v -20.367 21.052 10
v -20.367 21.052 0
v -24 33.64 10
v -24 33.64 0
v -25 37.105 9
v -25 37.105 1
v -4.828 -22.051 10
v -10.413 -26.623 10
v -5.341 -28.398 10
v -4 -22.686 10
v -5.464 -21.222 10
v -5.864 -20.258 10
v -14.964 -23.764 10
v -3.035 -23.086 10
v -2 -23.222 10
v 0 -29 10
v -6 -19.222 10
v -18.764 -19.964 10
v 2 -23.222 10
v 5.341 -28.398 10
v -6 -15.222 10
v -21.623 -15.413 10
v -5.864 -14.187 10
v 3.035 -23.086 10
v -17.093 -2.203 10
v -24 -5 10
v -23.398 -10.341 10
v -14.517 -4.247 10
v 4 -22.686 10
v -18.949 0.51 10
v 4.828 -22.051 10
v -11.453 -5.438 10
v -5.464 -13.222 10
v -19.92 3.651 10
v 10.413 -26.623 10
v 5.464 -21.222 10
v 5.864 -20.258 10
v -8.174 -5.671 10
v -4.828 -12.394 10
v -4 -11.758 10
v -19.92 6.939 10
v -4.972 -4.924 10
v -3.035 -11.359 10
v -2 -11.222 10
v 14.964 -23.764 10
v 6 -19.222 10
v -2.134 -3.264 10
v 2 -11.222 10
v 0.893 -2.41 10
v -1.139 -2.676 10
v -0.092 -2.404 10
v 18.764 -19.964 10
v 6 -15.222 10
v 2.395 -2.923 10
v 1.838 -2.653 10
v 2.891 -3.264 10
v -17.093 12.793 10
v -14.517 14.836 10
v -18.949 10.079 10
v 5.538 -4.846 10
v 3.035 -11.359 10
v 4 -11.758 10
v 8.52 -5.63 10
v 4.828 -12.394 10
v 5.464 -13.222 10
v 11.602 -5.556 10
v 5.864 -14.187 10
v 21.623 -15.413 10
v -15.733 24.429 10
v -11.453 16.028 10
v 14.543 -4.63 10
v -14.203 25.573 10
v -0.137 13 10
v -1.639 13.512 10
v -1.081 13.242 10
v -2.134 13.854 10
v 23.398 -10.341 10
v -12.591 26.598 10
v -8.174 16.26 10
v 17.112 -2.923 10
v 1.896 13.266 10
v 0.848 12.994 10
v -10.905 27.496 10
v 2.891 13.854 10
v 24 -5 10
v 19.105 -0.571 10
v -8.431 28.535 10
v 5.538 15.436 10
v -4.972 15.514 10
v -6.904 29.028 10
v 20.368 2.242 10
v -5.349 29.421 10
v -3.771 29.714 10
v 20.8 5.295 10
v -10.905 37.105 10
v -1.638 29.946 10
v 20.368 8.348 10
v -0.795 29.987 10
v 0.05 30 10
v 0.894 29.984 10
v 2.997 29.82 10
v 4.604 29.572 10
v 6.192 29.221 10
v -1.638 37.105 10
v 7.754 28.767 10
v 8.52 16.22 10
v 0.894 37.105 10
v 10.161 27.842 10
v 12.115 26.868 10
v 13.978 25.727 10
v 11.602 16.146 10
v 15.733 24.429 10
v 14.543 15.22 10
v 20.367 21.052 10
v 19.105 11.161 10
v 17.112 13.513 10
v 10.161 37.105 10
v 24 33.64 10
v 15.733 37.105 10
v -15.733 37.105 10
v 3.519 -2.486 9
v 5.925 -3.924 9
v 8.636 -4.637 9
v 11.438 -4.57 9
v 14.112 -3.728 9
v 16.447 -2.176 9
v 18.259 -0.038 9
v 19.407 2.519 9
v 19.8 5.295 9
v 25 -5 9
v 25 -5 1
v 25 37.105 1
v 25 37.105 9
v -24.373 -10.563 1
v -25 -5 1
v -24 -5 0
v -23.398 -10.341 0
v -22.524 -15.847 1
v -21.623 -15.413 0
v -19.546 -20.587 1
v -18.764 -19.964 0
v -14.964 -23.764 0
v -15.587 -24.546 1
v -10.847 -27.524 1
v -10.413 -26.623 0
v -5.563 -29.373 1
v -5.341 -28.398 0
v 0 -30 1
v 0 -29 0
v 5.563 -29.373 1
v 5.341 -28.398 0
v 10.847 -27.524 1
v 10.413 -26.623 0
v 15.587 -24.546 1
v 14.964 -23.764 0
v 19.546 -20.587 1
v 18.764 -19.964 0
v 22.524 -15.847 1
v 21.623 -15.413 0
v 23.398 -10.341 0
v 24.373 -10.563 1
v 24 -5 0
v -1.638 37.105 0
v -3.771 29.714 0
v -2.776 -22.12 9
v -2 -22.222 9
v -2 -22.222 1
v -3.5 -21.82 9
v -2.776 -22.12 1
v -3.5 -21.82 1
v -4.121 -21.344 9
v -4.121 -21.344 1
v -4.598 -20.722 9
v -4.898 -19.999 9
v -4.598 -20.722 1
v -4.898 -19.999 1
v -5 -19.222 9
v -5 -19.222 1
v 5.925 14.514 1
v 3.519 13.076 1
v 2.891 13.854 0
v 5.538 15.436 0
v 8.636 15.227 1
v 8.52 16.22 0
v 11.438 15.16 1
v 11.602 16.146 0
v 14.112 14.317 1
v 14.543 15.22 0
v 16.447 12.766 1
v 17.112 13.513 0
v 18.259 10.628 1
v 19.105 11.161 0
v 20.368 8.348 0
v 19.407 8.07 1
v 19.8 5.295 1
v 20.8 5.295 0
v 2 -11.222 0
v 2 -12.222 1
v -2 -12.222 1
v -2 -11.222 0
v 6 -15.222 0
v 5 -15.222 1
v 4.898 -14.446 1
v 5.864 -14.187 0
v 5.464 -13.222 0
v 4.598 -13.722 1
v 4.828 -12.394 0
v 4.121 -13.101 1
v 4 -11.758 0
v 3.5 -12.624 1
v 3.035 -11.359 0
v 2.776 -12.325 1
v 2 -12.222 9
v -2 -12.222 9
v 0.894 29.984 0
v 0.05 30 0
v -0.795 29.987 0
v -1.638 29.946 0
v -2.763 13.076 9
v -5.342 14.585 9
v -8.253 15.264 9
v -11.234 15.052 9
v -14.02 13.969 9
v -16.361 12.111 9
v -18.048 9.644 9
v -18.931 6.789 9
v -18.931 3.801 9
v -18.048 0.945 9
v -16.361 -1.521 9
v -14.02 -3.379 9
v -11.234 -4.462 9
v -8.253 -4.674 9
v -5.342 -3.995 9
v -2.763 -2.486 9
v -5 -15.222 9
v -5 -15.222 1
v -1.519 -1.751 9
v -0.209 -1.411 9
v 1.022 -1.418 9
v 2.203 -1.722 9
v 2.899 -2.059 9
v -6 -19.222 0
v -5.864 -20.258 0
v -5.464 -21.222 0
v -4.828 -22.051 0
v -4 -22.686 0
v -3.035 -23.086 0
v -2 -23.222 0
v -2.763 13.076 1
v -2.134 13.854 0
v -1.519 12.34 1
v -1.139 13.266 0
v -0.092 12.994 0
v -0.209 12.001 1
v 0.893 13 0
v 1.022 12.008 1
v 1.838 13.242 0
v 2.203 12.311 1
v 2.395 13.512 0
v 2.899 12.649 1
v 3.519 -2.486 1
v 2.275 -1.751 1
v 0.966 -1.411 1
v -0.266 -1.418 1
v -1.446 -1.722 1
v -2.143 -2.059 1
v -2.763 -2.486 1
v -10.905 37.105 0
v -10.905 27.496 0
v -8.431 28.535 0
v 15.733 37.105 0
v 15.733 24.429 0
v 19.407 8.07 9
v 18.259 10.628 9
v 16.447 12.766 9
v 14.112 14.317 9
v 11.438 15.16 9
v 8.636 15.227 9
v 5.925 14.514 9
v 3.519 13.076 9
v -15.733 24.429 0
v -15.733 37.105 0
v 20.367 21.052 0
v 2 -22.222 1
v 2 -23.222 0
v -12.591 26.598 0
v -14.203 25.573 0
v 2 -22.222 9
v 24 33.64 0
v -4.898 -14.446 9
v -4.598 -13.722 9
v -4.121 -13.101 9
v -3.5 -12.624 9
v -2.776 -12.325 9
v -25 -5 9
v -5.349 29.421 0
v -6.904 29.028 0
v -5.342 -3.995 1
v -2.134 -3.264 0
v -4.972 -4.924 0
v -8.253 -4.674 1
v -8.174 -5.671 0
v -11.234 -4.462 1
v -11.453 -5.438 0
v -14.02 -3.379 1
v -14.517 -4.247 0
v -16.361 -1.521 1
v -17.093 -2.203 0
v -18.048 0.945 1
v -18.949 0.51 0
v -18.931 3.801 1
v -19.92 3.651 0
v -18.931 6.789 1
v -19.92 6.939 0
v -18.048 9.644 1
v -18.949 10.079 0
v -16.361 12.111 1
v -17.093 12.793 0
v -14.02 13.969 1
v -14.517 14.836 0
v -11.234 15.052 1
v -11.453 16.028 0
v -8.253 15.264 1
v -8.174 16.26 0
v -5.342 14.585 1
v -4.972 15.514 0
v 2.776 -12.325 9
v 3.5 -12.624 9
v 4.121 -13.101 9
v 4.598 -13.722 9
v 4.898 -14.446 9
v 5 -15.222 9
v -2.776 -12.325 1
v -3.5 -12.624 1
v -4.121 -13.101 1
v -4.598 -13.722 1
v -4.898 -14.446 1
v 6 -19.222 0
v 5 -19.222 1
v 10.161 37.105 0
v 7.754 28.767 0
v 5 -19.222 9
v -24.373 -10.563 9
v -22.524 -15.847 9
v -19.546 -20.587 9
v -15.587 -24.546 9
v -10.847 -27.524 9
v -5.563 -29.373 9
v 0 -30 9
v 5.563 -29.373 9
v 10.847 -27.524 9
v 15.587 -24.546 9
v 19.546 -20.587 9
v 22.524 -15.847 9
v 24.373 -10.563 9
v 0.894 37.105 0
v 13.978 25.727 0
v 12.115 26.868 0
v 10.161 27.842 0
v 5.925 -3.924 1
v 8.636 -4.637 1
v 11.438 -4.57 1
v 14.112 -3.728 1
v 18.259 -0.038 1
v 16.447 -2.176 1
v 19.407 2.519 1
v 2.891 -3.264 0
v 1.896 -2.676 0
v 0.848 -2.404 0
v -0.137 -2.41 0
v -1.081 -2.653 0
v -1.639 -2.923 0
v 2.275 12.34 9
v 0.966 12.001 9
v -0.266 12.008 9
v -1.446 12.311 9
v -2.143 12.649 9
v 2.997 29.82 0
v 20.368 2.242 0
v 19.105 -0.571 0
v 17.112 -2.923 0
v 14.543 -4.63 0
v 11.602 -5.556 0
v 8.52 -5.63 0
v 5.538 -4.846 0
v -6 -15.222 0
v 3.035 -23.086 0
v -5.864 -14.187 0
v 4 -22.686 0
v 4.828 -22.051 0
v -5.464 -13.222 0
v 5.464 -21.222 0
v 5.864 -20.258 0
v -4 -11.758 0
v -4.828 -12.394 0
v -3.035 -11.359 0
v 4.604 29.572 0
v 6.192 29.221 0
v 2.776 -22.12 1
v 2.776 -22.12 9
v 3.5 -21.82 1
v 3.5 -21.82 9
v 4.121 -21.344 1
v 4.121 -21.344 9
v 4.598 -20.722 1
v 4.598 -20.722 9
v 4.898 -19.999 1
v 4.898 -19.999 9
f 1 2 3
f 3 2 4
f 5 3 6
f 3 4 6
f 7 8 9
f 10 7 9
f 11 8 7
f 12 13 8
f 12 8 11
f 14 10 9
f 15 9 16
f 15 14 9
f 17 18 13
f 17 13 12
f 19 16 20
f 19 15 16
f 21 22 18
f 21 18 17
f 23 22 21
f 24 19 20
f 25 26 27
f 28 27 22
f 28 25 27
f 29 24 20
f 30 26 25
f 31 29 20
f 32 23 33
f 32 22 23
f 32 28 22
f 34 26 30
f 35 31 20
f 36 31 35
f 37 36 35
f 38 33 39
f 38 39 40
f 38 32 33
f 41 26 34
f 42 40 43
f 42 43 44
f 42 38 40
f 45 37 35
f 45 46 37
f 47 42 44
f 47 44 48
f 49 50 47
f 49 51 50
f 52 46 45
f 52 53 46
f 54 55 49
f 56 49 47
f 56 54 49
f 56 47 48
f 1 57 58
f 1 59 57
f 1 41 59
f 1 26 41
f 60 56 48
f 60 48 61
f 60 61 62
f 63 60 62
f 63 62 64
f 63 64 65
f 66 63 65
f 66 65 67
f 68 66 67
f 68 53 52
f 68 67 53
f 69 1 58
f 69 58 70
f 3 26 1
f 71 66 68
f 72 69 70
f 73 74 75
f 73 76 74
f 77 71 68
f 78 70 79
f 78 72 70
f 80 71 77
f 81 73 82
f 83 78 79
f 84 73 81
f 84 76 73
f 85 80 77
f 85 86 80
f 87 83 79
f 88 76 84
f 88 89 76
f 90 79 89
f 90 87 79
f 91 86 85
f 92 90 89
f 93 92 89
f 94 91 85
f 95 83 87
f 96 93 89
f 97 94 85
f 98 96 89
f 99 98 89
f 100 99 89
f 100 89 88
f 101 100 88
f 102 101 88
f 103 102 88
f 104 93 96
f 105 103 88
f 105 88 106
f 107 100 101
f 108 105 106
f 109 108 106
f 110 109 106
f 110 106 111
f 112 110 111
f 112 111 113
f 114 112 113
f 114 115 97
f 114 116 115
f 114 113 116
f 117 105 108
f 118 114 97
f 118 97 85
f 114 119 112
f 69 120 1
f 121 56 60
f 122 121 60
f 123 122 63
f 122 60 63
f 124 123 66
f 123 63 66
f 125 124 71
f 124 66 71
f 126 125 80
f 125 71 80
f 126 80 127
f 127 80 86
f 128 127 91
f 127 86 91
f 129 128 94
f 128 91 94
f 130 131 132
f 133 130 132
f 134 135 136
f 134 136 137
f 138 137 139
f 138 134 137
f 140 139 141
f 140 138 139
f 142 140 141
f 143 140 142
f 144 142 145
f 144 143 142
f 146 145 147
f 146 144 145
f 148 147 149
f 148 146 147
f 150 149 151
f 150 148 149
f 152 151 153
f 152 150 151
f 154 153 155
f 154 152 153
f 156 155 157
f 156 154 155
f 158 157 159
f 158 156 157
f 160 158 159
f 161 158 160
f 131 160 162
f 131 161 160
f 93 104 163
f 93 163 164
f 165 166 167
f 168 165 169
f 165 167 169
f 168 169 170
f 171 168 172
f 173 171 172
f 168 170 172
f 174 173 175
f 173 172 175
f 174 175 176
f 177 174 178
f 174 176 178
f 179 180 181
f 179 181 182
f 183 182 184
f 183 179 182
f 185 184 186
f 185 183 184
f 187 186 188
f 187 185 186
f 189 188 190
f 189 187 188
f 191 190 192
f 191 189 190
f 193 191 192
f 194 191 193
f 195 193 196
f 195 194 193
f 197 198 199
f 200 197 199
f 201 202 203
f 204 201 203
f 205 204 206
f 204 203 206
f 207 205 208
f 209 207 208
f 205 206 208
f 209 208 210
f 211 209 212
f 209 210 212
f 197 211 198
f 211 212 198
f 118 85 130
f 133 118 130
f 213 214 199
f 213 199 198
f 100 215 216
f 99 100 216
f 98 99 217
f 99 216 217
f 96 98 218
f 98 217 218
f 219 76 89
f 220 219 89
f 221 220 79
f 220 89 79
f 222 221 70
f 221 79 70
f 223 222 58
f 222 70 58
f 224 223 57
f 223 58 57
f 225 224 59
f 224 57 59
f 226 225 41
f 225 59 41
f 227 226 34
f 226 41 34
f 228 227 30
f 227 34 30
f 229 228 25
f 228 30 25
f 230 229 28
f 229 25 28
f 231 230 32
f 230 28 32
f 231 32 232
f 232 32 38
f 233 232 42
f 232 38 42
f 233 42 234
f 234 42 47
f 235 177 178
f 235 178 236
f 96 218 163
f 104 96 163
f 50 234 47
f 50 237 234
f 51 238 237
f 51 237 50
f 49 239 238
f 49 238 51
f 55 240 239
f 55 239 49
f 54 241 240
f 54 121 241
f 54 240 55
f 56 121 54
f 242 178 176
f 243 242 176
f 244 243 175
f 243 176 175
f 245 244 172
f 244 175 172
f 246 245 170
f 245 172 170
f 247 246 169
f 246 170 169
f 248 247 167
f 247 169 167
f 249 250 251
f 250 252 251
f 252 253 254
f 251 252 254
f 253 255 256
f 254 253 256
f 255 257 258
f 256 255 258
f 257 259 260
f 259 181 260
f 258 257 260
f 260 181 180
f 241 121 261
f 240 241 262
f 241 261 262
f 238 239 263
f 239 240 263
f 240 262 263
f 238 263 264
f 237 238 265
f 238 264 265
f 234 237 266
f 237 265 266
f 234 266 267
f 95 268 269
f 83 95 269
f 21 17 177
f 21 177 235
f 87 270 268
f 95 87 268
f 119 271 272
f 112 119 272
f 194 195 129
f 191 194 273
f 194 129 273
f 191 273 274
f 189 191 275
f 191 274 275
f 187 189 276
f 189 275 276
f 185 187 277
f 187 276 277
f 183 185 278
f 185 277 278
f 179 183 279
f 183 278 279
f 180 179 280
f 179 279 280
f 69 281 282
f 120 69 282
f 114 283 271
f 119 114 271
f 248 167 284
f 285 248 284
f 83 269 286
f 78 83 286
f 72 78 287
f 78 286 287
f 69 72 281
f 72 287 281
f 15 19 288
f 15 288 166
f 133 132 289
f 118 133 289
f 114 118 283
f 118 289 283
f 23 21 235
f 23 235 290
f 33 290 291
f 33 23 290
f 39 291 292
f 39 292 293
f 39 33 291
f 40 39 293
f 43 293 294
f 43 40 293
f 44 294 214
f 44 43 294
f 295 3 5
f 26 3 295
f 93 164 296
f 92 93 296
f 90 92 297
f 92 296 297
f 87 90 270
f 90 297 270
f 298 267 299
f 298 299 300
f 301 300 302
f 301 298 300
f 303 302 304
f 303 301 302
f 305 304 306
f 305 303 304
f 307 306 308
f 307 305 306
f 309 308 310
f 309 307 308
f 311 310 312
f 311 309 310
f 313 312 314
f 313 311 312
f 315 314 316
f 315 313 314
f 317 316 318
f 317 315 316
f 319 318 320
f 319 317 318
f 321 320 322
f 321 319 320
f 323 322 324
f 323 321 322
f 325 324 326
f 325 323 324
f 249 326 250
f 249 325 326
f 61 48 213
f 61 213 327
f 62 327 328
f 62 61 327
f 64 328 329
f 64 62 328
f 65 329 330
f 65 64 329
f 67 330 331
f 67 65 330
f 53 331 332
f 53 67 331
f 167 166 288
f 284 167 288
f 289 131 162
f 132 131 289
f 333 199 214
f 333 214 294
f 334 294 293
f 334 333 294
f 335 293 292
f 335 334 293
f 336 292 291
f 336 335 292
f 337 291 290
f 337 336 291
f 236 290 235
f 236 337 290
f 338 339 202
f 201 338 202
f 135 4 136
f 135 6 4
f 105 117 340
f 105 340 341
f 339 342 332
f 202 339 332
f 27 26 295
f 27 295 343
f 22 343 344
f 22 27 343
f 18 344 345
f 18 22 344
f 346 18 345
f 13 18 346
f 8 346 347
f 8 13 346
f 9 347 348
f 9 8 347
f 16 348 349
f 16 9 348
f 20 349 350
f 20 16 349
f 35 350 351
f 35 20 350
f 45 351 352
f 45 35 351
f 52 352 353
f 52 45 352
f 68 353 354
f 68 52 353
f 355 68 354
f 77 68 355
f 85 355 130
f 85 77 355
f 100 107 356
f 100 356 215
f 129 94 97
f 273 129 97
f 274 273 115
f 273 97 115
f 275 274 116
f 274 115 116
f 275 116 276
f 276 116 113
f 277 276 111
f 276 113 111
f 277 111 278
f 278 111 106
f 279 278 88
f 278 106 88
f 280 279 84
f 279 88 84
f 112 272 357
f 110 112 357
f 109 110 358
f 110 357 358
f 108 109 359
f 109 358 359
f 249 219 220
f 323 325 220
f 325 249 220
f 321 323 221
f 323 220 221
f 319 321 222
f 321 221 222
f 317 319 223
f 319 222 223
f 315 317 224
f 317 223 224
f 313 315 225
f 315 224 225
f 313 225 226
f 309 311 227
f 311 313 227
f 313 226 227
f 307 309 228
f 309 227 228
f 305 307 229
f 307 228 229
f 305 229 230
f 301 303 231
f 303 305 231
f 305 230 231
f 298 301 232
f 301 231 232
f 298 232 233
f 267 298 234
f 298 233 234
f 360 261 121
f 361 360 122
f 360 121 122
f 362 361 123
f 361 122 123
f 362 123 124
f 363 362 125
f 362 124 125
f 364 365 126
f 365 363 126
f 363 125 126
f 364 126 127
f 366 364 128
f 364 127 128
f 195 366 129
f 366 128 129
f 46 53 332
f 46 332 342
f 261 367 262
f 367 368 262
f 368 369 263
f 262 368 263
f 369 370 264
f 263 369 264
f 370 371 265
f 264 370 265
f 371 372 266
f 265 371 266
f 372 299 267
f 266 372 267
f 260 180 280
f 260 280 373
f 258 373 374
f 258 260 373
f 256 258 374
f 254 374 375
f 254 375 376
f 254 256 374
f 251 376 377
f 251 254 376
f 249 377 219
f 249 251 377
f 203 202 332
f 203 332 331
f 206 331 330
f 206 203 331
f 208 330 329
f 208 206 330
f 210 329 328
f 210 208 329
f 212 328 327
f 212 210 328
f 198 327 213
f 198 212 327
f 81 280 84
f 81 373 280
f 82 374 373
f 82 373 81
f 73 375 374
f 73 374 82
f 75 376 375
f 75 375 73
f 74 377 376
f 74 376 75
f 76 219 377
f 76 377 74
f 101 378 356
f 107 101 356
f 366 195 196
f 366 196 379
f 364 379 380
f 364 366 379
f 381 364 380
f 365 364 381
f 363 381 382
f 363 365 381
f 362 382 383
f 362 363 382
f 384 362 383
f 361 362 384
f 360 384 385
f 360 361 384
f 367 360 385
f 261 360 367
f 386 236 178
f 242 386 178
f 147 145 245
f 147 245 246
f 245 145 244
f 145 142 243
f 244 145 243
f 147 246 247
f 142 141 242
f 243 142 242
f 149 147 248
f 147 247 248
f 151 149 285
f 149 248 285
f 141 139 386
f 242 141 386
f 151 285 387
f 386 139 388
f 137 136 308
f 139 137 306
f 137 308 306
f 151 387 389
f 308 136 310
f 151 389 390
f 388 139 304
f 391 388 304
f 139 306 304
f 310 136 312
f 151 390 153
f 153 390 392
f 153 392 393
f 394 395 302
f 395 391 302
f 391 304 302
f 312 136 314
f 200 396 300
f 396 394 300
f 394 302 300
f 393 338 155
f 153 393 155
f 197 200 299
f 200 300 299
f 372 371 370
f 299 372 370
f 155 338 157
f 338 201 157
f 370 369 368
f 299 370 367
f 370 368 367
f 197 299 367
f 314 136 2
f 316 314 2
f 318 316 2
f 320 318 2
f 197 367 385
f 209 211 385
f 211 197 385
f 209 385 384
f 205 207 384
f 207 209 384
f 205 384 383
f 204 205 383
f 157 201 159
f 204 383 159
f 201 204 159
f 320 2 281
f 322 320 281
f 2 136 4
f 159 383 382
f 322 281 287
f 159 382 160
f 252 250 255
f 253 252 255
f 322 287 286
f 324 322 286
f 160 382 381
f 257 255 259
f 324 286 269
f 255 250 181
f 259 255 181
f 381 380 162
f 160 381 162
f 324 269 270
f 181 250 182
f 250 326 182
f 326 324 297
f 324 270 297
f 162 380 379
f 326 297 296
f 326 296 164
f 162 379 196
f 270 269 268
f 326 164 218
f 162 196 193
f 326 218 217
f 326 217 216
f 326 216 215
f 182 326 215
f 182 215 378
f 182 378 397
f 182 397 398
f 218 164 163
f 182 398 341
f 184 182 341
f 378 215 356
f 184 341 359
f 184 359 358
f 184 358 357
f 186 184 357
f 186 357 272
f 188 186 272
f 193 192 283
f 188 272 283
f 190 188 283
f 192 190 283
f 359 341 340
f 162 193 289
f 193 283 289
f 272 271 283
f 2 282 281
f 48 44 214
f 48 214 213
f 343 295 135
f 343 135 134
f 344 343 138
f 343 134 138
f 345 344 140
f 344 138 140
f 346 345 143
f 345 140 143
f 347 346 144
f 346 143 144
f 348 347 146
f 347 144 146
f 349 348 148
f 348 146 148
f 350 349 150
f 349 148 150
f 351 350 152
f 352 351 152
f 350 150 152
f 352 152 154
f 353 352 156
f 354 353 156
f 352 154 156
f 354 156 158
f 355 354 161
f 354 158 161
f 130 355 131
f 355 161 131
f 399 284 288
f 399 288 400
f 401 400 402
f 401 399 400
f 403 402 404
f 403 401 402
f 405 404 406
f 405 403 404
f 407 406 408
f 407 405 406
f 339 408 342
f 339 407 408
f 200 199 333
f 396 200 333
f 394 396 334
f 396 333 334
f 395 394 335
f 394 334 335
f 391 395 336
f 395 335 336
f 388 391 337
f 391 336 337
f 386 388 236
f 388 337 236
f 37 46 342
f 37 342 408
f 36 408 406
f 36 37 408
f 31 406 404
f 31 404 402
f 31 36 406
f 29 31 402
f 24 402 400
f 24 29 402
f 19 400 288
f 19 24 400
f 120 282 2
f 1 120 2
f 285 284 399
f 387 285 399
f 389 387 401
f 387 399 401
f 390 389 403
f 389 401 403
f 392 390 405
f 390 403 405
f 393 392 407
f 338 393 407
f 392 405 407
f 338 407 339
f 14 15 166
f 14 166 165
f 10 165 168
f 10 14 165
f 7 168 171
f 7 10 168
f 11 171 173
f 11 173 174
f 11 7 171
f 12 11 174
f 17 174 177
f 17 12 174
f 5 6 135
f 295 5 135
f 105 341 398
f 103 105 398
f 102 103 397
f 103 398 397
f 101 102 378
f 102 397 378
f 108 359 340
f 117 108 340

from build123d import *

# Parameters (mm, degrees)
F1_DEPTH = 10
F3_DEPTH = 25
F4_R     = 5
F5_W     = 10
F5_H     = 10
F6_DEPTH = 25
F7_R     = 3
F8_SIZE  = 1


with BuildPart() as f1:
    # F0 (on Top) → F1 (new body)
    with BuildSketch(Plane.XY):
        Polygon((-10.9047358856, 5), (-1.6377953812, 5), (-6.2712656334, 21.0524187982), align=None)
        Polygon((0.893718563, 5), (10.1606590673, 5), (5.5271888152, 21.0524187982), align=None)
        with BuildLine():
            ThreePointArc((-25, -5), (0, -30), (25, -5))
            Line((25, -5), (-25, -5))
        make_face()
        with BuildLine():
            ThreePointArc((7.7540047355, 28.767107745), (8.969264738, 28.3356441964), (10.1606590673, 27.842088506))
            Line((10.1606590673, 27.842088506), (10.1606590673, 37.1048375964))
            Line((10.1606590673, 37.1048375964), (7.7540047355, 28.767107745))
        make_face()
        with BuildLine():
            Line((0.893718563, 37.1048375964), (0.893718563, 29.9840202355))
            ThreePointArc((0.893718563, 29.9840202355), (1.9468556818, 29.9240797815), (2.9965268036, 29.8197668626))
            Line((2.9965268036, 29.8197668626), (0.893718563, 37.1048375964))
        make_face()
        with BuildLine():
            ThreePointArc((-3.7711526138, 29.713931455), (-2.7069683761, 29.8530143486), (-1.6377953812, 29.9462948409))
            Line((-1.6377953812, 29.9462948409), (-1.6377953812, 37.1048375964))
            Line((-1.6377953812, 37.1048375964), (-3.7711526138, 29.713931455))
        make_face()
        with BuildLine():
            Line((-10.9047358856, 37.1048375964), (-10.9047358856, 27.4963716022))
            ThreePointArc((-10.9047358856, 27.4963716022), (-9.6819154679, 28.0490891983), (-8.4311989498, 28.535396412))
            Line((-8.4311989498, 28.535396412), (-10.9047358856, 37.1048375964))
        make_face()
        with BuildLine():
            ThreePointArc((21.1545569723, 18.3223391079), (24.0194080309, 11.9331117001), (25, 5))
            Line((25, 5), (25, 37.1048375964))
            Line((25, 37.1048375964), (20.3665297478, 21.0524187982))
            Line((20.3665297478, 21.0524187982), (21.1545569723, 18.3223391079))
        make_face()
        with BuildLine():
            Line((21.1545569723, 18.3223391079), (25, 5))
            ThreePointArc((25, 5), (24.0194080309, 11.9331117001), (21.1545569723, 18.3223391079))
        make_face()
        with BuildLine():
            ThreePointArc((15.7330594957, 24.4286087743), (18.0294324279, 22.3187634179), (20.0452738513, 19.9394443078))
            Line((20.0452738513, 19.9394443078), (20.3665297478, 21.0524187982))
            Line((20.3665297478, 21.0524187982), (15.7330594957, 37.1048375964))
            Line((15.7330594957, 37.1048375964), (15.7330594957, 24.4286087743))
        make_face()
        with BuildLine():
            Line((2.9965268036, 29.8197668626), (5.5271888152, 21.0524187982))
            Line((5.5271888152, 21.0524187982), (7.7540047355, 28.767107745))
            ThreePointArc((7.7540047355, 28.767107745), (5.4009725881, 29.4096189053), (2.9965268036, 29.8197668626))
        make_face()
        with BuildLine():
            Line((-8.4311989498, 28.535396412), (-6.2712656334, 21.0524187982))
            Line((-6.2712656334, 21.0524187982), (-3.7711526138, 29.713931455))
            ThreePointArc((-3.7711526138, 29.713931455), (-6.1295662271, 29.2369226155), (-8.4311989498, 28.535396412))
        make_face()
        with BuildLine():
            Line((-20.3665297478, 21.0524187982), (-20.0452738513, 19.9394443078))
            ThreePointArc((-20.0452738513, 19.9394443078), (-18.0294324279, 22.3187634179), (-15.7330594957, 24.4286087743))
            Line((-15.7330594957, 24.4286087743), (-15.7330594957, 37.1048375964))
            Line((-15.7330594957, 37.1048375964), (-20.3665297478, 21.0524187982))
        make_face()
        with BuildLine():
            Line((-25, 37.1048375964), (-25, 5))
            ThreePointArc((-25, 5), (-24.0194080309, 11.9331117001), (-21.1545569723, 18.3223391079))
            Line((-21.1545569723, 18.3223391079), (-20.3665297478, 21.0524187982))
            Line((-20.3665297478, 21.0524187982), (-25, 37.1048375964))
        make_face()
        with BuildLine():
            ThreePointArc((-21.1545569723, 18.3223391079), (-24.0194080309, 11.9331117001), (-25, 5))
            Line((-25, 5), (-21.1545569723, 18.3223391079))
        make_face()
        with BuildLine():
            Line((10.1606590673, 5), (15.7330594957, 5))
            Line((15.7330594957, 5), (15.7330594957, 24.4286087743))
            ThreePointArc((15.7330594957, 24.4286087743), (13.0588715525, 26.3182052194), (10.1606590673, 27.842088506))
            Line((10.1606590673, 27.842088506), (10.1606590673, 5))
        make_face()
        with BuildLine():
            Line((-1.6377953812, 5), (0.893718563, 5))
            Line((0.893718563, 5), (0.893718563, 29.9840202355))
            ThreePointArc((0.893718563, 29.9840202355), (-0.3725162805, 29.9972244783), (-1.6377953812, 29.9462948409))
            Line((-1.6377953812, 29.9462948409), (-1.6377953812, 5))
        make_face()
        with BuildLine():
            Line((-15.7330594957, 24.4286087743), (-15.7330594957, 5))
            Line((-15.7330594957, 5), (-10.9047358856, 5))
            Line((-10.9047358856, 5), (-10.9047358856, 27.4963716022))
            ThreePointArc((-10.9047358856, 27.4963716022), (-13.4069320833, 26.1010467066), (-15.7330594957, 24.4286087743))
        make_face()
        with BuildLine():
            ThreePointArc((20.0452738513, 19.9394443078), (20.615777266, 19.1417724391), (21.1545569723, 18.3223391079))
            Line((21.1545569723, 18.3223391079), (20.3665297478, 21.0524187982))
            Line((20.3665297478, 21.0524187982), (20.0452738513, 19.9394443078))
        make_face()
        with BuildLine():
            Line((15.7330594957, 24.4286087743), (15.7330594957, 5))
            Line((15.7330594957, 5), (20.0452738513, 19.9394443078))
            ThreePointArc((20.0452738513, 19.9394443078), (18.0294324279, 22.3187634179), (15.7330594957, 24.4286087743))
        make_face()
        with BuildLine():
            Line((-20.0452738513, 19.9394443078), (-15.7330594957, 5))
            Line((-15.7330594957, 5), (-15.7330594957, 24.4286087743))
            ThreePointArc((-15.7330594957, 24.4286087743), (-18.0294324279, 22.3187634179), (-20.0452738513, 19.9394443078))
        make_face()
        with BuildLine():
            Line((-20.3665297478, 21.0524187982), (-21.1545569723, 18.3223391079))
            ThreePointArc((-21.1545569723, 18.3223391079), (-20.615777266, 19.1417724391), (-20.0452738513, 19.9394443078))
            Line((-20.0452738513, 19.9394443078), (-20.3665297478, 21.0524187982))
        make_face()
        with BuildLine():
            Line((15.7330594957, 5), (25, 5))
            Line((25, 5), (21.1545569723, 18.3223391079))
            ThreePointArc((21.1545569723, 18.3223391079), (20.615777266, 19.1417724391), (20.0452738513, 19.9394443078))
            Line((20.0452738513, 19.9394443078), (15.7330594957, 5))
        make_face()
        with BuildLine():
            Line((5.5271888152, 21.0524187982), (10.1606590673, 5))
            Line((10.1606590673, 5), (10.1606590673, 27.842088506))
            ThreePointArc((10.1606590673, 27.842088506), (8.969264738, 28.3356441964), (7.7540047355, 28.767107745))
            Line((7.7540047355, 28.767107745), (5.5271888152, 21.0524187982))
        make_face()
        with BuildLine():
            Line((0.893718563, 29.9840202355), (0.893718563, 5))
            Line((0.893718563, 5), (5.5271888152, 21.0524187982))
            Line((5.5271888152, 21.0524187982), (2.9965268036, 29.8197668626))
            ThreePointArc((2.9965268036, 29.8197668626), (1.9468556818, 29.9240797815), (0.893718563, 29.9840202355))
        make_face()
        with BuildLine():
            Line((-6.2712656334, 21.0524187982), (-1.6377953812, 5))
            Line((-1.6377953812, 5), (-1.6377953812, 29.9462948409))
            ThreePointArc((-1.6377953812, 29.9462948409), (-2.7069683761, 29.8530143486), (-3.7711526138, 29.713931455))
            Line((-3.7711526138, 29.713931455), (-6.2712656334, 21.0524187982))
        make_face()
        with BuildLine():
            Line((-10.9047358856, 27.4963716022), (-10.9047358856, 5))
            Line((-10.9047358856, 5), (-6.2712656334, 21.0524187982))
            Line((-6.2712656334, 21.0524187982), (-8.4311989498, 28.535396412))
            ThreePointArc((-8.4311989498, 28.535396412), (-9.6819154679, 28.0490891983), (-10.9047358856, 27.4963716022))
        make_face()
        Polygon((25, -5), (25, 5), (15.7330594957, 5), (10.1606590673, 5), (0.893718563, 5), (-1.6377953812, 5), (-10.9047358856, 5), (-15.7330594957, 5), (-25, 5), (-25, -5), align=None)
        with BuildLine():
            Line((-21.1545569723, 18.3223391079), (-25, 5))
            Line((-25, 5), (-15.7330594957, 5))
            Line((-15.7330594957, 5), (-20.0452738513, 19.9394443078))
            ThreePointArc((-20.0452738513, 19.9394443078), (-20.615777266, 19.1417724391), (-21.1545569723, 18.3223391079))
        make_face()
    extrude(amount=F1_DEPTH)

    # F2 (on face) → F3 (cut)
    with BuildSketch(Plane.XY.offset(10)):
        with BuildLine():
            ThreePointArc((0.3781150769, 1.944110059), (0.8106415831, 3.5947742399), (0.9562301539, 5.2949434623))
            ThreePointArc((0.9562301539, 5.2949434623), (0.8106415831, 6.9951126847), (0.3781150769, 8.6457768657))
            ThreePointArc((0.3781150769, 8.6457768657), (-0.2, 5.2949434623), (0.3781150769, 1.944110059))
        make_face()
        with BuildLine():
            ThreePointArc((0.3781150769, 8.6457768657), (0.8106415831, 6.9951126847), (0.9562301539, 5.2949434623))
            ThreePointArc((0.9562301539, 5.2949434623), (0.8106415831, 3.5947742399), (0.3781150769, 1.944110059))
            ThreePointArc((0.3781150769, 1.944110059), (11.5001692224, -4.5594679668), (19.8, 5.2949434623))
            ThreePointArc((19.8, 5.2949434623), (11.5001692224, 15.1493548915), (0.3781150769, 8.6457768657))
        make_face()
        with BuildLine():
            ThreePointArc((0.3781150769, 1.944110059), (-0.2, 5.2949434623), (0.3781150769, 8.6457768657))
            ThreePointArc((0.3781150769, 8.6457768657), (-19.0437698461, 5.2949434623), (0.3781150769, 1.944110059))
        make_face()
    extrude(amount=-F3_DEPTH, mode=Mode.SUBTRACT)

    # F4
    f4_edges = [f1.edges().sort_by_distance(p)[0] for p in [
        (0.378115, 8.645777, 5),
        (0.378115, 1.94411, 5),
    ]]
    fillet(f4_edges, radius=F4_R)

    # F5 (on face) → F6 (cut)
    with BuildSketch(Plane.XY.offset(10)):
        with Locations((0, -17.2223318368)):
            Rectangle(F5_W, F5_H)
    extrude(amount=-F6_DEPTH, mode=Mode.SUBTRACT)

    # F7
    f7_edges = [f1.edges().sort_by_distance(p)[0] for p in [
        (-5, -22.222332, 5),
        (-5, -12.222332, 5),
        (5, -12.222332, 5),
        (5, -22.222332, 5),
    ]]
    fillet(f7_edges, radius=F7_R)

    # F8
    f8_edges = [f1.edges().sort_by_distance(p)[0] for p in [
        (0, -30, 10),
        (0, -30, 0),
        (-19.04377, 5.294943, 10),
        (0, -12.222332, 10),
        (0, -22.222332, 0),
        (0.378115, -1.376735, 0),
    ]]
    chamfer(f8_edges, length=F8_SIZE)


solid = f1.part
